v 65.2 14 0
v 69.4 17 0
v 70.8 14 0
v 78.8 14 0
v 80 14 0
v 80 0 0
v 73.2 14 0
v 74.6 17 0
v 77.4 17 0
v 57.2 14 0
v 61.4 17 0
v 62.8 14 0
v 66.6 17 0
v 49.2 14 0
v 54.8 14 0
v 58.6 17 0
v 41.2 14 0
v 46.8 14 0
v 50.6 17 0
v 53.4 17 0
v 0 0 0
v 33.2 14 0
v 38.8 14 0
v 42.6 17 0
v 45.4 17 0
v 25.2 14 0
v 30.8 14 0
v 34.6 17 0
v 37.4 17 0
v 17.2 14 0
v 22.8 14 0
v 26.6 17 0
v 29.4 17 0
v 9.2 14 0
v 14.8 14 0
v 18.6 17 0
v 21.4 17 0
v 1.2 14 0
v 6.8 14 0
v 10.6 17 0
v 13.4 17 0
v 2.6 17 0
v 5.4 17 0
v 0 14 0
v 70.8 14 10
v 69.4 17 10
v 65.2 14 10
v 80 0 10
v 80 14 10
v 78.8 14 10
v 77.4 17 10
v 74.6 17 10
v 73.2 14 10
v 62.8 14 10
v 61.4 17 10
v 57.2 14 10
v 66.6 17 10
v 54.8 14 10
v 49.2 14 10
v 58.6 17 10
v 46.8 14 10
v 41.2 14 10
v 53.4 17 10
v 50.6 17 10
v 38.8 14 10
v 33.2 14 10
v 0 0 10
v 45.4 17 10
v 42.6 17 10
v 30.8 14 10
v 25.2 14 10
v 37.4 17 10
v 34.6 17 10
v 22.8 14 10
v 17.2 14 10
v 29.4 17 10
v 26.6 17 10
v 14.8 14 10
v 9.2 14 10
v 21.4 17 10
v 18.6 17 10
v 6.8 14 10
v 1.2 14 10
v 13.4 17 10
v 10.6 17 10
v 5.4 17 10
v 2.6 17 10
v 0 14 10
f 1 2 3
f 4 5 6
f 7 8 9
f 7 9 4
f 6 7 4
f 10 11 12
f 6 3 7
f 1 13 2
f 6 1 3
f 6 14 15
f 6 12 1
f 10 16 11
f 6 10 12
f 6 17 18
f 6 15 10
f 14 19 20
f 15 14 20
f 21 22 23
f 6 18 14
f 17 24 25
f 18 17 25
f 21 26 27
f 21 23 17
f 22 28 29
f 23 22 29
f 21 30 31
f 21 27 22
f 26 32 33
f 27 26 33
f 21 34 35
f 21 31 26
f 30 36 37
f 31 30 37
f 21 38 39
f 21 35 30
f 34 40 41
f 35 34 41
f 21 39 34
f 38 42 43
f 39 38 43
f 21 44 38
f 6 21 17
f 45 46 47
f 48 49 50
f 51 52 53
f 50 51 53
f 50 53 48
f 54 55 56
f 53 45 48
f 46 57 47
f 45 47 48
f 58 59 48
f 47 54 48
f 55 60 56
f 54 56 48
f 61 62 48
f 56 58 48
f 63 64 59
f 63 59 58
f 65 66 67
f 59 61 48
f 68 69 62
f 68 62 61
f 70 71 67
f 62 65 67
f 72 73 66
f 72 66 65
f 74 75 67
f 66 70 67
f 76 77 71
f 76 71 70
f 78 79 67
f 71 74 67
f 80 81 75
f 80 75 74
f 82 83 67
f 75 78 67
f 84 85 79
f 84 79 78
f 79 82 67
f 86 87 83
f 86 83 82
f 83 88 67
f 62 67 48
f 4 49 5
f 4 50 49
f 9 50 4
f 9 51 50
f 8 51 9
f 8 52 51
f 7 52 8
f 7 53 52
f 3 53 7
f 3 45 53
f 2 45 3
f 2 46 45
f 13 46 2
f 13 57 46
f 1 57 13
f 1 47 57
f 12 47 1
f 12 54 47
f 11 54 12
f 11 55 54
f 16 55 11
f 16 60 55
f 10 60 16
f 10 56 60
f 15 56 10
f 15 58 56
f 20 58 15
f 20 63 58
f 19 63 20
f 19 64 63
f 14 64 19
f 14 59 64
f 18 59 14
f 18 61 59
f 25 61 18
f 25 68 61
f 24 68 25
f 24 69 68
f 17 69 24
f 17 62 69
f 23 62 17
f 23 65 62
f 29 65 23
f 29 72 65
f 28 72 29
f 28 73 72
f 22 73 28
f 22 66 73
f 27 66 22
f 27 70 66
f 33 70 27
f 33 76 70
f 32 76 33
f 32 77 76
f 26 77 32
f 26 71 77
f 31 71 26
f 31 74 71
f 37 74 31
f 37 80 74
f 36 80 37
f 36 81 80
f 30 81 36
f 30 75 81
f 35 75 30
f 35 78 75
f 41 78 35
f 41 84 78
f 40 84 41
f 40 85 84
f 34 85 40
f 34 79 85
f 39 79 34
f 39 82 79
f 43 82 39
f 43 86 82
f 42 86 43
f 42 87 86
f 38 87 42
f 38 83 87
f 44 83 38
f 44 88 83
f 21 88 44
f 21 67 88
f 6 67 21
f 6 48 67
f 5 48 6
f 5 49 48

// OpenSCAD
$fn = 32;

// ----------------------------------------------------------------------
// Gear rack: 10 teeth, pitch 8 mm
// ----------------------------------------------------------------------

// --- parameters (mm) ---
teeth = 10;               // number of teeth
pitch = 8;                // tooth pitch, X
root_w = 5.6;             // tooth width at the root
tip_w = 2.8;              // tooth width at the tip
base_h = 14;              // rack body height, Y
tooth_h = 3;              // tooth height above the body
plate_t = 10;             // rack width, Z (extrusion height)

rack_l = teeth * pitch;  // overall length
total_h = base_h + tooth_h;  // overall height

profile = [[0, 0], [80, 0], [80, 14], [78.8, 14], [77.4, 17], [74.6, 17], [73.2, 14], [70.8, 14], [69.4, 17], [66.6, 17], [65.2, 14], [62.8, 14], [61.4, 17], [58.6, 17], [57.2, 14], [54.8, 14], [53.4, 17], [50.6, 17], [49.2, 14], [46.8, 14], [45.4, 17], [42.6, 17], [41.2, 14], [38.8, 14], [37.4, 17], [34.6, 17], [33.2, 14], [30.8, 14], [29.4, 17], [26.6, 17], [25.2, 14], [22.8, 14], [21.4, 17], [18.6, 17], [17.2, 14], [14.8, 14], [13.4, 17], [10.6, 17], [9.2, 14], [6.8, 14], [5.4, 17], [2.6, 17], [1.2, 14], [0, 14]];  // primary outline, 44 points, counter clockwise

// --- the one profile operation ---
linear_extrude(height = plate_t) polygon(points = profile);
